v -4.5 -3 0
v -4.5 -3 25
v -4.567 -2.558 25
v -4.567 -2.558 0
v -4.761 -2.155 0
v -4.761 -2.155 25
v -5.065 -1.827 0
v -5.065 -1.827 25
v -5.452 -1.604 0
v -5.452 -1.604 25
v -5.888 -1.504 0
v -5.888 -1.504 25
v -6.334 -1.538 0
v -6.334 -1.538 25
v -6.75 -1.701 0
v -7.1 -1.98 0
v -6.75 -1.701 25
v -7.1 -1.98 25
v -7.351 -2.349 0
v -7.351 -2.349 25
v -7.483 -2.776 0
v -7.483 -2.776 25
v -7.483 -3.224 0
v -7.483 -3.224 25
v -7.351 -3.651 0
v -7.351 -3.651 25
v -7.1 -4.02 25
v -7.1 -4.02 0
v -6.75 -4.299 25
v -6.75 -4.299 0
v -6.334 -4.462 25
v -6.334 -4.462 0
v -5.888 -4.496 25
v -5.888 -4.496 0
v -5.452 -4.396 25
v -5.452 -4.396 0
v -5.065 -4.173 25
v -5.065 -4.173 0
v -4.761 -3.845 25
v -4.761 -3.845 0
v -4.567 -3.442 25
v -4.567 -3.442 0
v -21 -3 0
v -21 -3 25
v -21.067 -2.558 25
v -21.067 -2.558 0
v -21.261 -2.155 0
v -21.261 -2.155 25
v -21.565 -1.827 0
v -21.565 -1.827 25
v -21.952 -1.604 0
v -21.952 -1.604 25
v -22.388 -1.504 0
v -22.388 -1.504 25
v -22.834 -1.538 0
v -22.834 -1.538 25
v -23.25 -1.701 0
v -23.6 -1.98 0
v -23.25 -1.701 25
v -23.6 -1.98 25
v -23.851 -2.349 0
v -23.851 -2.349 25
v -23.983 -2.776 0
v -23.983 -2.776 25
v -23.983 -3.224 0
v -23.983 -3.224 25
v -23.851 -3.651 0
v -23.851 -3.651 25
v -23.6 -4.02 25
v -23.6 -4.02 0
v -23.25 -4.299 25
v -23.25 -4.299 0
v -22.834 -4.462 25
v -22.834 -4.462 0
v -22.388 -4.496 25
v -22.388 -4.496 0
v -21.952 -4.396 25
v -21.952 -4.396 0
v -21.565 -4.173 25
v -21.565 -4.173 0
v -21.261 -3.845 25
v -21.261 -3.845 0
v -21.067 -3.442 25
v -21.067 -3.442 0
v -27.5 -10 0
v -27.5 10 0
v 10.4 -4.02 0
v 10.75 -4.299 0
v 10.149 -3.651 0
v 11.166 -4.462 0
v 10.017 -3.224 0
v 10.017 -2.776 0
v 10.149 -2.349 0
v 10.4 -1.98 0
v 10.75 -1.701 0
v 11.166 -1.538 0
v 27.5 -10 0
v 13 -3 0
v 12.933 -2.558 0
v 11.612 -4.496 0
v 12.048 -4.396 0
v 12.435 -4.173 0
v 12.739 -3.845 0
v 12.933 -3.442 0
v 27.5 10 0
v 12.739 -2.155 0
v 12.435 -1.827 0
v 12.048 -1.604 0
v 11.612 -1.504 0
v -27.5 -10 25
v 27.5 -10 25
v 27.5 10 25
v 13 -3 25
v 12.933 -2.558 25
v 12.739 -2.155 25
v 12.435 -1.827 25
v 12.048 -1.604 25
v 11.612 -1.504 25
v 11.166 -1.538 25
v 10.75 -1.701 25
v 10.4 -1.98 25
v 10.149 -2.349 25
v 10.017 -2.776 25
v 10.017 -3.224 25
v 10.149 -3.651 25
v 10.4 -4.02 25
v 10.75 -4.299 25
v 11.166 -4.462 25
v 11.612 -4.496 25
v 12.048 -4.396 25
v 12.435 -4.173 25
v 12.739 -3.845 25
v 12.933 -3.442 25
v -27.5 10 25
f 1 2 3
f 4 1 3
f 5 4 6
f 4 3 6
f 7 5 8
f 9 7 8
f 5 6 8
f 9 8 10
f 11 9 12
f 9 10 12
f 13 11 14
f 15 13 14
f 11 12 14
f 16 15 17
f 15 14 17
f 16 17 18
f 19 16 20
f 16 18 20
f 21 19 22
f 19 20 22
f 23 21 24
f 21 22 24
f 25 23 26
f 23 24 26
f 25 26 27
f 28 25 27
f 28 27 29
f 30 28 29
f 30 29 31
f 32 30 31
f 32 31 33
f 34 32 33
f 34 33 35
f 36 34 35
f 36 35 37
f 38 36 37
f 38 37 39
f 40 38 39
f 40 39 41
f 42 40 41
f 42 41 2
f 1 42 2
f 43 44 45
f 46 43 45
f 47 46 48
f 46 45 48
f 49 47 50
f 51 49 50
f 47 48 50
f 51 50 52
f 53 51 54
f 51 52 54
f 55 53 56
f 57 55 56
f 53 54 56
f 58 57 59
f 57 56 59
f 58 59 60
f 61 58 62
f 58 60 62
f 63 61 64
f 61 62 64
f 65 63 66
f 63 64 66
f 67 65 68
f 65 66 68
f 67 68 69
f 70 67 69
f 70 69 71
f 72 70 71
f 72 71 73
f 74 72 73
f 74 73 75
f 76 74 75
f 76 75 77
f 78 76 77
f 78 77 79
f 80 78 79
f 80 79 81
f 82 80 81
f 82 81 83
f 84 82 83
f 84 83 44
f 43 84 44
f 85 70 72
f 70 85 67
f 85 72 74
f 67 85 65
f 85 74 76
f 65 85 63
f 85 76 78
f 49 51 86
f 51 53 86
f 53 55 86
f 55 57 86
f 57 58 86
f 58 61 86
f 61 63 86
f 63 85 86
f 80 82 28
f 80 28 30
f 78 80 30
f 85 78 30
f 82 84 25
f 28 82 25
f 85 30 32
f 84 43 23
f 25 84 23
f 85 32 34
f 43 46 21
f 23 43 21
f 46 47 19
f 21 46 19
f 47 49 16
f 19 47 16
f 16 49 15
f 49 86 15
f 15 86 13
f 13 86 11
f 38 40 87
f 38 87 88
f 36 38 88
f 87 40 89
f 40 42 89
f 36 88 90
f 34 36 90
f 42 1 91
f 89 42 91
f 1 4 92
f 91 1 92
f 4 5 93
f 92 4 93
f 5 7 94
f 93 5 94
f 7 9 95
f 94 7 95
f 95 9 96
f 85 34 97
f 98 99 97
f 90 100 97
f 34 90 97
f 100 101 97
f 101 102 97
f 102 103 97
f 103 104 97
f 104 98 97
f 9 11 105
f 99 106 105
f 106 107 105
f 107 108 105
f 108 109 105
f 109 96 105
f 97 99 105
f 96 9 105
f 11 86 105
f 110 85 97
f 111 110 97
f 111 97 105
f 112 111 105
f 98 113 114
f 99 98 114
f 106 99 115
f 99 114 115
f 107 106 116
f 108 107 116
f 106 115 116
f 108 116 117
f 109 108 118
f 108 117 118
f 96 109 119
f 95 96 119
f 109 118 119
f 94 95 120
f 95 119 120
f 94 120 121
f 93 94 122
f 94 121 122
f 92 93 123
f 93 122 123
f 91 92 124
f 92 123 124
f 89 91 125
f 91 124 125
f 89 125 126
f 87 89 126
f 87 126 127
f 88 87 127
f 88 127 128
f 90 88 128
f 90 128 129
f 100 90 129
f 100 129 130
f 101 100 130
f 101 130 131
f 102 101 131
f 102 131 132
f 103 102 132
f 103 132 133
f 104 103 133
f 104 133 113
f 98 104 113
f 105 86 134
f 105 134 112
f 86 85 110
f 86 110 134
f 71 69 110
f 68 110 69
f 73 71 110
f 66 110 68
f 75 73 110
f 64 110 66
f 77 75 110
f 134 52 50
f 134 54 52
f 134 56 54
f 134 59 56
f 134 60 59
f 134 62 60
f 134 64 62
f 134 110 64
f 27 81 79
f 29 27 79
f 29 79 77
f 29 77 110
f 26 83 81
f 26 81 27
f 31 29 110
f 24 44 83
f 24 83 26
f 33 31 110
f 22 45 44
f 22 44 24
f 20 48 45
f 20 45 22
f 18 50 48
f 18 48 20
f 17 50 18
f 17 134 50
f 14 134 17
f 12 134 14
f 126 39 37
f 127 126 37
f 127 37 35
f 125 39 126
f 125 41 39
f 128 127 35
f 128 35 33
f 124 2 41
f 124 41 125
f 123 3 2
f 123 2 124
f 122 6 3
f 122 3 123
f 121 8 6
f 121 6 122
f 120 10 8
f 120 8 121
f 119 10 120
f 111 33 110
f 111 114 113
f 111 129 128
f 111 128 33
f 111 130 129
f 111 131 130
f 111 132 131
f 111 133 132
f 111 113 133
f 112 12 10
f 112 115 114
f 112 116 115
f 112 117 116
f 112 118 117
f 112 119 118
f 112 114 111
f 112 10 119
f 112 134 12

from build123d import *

# Parameters (mm, degrees)
F0_W     = 55
F0_H     = 20
F1_DEPTH = 25
F2_R     = 1.5
F3_DEPTH = 25.001
F4_R     = 1.5
F5_DEPTH = 25.001
F6_R     = 1.5
F7_DEPTH = 25.001


with BuildPart() as f1:
    # F0 (on Top) → F1 (new body)
    with BuildSketch(Plane.XY):
        Rectangle(F0_W, F0_H)
    extrude(amount=F1_DEPTH)

    # F2 (on face) → F3 (cut, through all)
    with BuildSketch(Plane.XY.offset(25)):
        with Locations((-22.5, -3)):
            Circle(F2_R)
    extrude(amount=-F3_DEPTH, mode=Mode.SUBTRACT)

    # F4 (on face) → F5 (cut, through all)
    with BuildSketch(Plane.XY.offset(25)):
        with Locations((-6, -3)):
            Circle(F4_R)
    extrude(amount=-F5_DEPTH, mode=Mode.SUBTRACT)

    # F6 (on face) → F7 (cut, through all)
    with BuildSketch(Plane.XY.offset(25)):
        with Locations((11.5, -3)):
            Circle(F6_R)
    extrude(amount=-F7_DEPTH, mode=Mode.SUBTRACT)


solid = f1.part
